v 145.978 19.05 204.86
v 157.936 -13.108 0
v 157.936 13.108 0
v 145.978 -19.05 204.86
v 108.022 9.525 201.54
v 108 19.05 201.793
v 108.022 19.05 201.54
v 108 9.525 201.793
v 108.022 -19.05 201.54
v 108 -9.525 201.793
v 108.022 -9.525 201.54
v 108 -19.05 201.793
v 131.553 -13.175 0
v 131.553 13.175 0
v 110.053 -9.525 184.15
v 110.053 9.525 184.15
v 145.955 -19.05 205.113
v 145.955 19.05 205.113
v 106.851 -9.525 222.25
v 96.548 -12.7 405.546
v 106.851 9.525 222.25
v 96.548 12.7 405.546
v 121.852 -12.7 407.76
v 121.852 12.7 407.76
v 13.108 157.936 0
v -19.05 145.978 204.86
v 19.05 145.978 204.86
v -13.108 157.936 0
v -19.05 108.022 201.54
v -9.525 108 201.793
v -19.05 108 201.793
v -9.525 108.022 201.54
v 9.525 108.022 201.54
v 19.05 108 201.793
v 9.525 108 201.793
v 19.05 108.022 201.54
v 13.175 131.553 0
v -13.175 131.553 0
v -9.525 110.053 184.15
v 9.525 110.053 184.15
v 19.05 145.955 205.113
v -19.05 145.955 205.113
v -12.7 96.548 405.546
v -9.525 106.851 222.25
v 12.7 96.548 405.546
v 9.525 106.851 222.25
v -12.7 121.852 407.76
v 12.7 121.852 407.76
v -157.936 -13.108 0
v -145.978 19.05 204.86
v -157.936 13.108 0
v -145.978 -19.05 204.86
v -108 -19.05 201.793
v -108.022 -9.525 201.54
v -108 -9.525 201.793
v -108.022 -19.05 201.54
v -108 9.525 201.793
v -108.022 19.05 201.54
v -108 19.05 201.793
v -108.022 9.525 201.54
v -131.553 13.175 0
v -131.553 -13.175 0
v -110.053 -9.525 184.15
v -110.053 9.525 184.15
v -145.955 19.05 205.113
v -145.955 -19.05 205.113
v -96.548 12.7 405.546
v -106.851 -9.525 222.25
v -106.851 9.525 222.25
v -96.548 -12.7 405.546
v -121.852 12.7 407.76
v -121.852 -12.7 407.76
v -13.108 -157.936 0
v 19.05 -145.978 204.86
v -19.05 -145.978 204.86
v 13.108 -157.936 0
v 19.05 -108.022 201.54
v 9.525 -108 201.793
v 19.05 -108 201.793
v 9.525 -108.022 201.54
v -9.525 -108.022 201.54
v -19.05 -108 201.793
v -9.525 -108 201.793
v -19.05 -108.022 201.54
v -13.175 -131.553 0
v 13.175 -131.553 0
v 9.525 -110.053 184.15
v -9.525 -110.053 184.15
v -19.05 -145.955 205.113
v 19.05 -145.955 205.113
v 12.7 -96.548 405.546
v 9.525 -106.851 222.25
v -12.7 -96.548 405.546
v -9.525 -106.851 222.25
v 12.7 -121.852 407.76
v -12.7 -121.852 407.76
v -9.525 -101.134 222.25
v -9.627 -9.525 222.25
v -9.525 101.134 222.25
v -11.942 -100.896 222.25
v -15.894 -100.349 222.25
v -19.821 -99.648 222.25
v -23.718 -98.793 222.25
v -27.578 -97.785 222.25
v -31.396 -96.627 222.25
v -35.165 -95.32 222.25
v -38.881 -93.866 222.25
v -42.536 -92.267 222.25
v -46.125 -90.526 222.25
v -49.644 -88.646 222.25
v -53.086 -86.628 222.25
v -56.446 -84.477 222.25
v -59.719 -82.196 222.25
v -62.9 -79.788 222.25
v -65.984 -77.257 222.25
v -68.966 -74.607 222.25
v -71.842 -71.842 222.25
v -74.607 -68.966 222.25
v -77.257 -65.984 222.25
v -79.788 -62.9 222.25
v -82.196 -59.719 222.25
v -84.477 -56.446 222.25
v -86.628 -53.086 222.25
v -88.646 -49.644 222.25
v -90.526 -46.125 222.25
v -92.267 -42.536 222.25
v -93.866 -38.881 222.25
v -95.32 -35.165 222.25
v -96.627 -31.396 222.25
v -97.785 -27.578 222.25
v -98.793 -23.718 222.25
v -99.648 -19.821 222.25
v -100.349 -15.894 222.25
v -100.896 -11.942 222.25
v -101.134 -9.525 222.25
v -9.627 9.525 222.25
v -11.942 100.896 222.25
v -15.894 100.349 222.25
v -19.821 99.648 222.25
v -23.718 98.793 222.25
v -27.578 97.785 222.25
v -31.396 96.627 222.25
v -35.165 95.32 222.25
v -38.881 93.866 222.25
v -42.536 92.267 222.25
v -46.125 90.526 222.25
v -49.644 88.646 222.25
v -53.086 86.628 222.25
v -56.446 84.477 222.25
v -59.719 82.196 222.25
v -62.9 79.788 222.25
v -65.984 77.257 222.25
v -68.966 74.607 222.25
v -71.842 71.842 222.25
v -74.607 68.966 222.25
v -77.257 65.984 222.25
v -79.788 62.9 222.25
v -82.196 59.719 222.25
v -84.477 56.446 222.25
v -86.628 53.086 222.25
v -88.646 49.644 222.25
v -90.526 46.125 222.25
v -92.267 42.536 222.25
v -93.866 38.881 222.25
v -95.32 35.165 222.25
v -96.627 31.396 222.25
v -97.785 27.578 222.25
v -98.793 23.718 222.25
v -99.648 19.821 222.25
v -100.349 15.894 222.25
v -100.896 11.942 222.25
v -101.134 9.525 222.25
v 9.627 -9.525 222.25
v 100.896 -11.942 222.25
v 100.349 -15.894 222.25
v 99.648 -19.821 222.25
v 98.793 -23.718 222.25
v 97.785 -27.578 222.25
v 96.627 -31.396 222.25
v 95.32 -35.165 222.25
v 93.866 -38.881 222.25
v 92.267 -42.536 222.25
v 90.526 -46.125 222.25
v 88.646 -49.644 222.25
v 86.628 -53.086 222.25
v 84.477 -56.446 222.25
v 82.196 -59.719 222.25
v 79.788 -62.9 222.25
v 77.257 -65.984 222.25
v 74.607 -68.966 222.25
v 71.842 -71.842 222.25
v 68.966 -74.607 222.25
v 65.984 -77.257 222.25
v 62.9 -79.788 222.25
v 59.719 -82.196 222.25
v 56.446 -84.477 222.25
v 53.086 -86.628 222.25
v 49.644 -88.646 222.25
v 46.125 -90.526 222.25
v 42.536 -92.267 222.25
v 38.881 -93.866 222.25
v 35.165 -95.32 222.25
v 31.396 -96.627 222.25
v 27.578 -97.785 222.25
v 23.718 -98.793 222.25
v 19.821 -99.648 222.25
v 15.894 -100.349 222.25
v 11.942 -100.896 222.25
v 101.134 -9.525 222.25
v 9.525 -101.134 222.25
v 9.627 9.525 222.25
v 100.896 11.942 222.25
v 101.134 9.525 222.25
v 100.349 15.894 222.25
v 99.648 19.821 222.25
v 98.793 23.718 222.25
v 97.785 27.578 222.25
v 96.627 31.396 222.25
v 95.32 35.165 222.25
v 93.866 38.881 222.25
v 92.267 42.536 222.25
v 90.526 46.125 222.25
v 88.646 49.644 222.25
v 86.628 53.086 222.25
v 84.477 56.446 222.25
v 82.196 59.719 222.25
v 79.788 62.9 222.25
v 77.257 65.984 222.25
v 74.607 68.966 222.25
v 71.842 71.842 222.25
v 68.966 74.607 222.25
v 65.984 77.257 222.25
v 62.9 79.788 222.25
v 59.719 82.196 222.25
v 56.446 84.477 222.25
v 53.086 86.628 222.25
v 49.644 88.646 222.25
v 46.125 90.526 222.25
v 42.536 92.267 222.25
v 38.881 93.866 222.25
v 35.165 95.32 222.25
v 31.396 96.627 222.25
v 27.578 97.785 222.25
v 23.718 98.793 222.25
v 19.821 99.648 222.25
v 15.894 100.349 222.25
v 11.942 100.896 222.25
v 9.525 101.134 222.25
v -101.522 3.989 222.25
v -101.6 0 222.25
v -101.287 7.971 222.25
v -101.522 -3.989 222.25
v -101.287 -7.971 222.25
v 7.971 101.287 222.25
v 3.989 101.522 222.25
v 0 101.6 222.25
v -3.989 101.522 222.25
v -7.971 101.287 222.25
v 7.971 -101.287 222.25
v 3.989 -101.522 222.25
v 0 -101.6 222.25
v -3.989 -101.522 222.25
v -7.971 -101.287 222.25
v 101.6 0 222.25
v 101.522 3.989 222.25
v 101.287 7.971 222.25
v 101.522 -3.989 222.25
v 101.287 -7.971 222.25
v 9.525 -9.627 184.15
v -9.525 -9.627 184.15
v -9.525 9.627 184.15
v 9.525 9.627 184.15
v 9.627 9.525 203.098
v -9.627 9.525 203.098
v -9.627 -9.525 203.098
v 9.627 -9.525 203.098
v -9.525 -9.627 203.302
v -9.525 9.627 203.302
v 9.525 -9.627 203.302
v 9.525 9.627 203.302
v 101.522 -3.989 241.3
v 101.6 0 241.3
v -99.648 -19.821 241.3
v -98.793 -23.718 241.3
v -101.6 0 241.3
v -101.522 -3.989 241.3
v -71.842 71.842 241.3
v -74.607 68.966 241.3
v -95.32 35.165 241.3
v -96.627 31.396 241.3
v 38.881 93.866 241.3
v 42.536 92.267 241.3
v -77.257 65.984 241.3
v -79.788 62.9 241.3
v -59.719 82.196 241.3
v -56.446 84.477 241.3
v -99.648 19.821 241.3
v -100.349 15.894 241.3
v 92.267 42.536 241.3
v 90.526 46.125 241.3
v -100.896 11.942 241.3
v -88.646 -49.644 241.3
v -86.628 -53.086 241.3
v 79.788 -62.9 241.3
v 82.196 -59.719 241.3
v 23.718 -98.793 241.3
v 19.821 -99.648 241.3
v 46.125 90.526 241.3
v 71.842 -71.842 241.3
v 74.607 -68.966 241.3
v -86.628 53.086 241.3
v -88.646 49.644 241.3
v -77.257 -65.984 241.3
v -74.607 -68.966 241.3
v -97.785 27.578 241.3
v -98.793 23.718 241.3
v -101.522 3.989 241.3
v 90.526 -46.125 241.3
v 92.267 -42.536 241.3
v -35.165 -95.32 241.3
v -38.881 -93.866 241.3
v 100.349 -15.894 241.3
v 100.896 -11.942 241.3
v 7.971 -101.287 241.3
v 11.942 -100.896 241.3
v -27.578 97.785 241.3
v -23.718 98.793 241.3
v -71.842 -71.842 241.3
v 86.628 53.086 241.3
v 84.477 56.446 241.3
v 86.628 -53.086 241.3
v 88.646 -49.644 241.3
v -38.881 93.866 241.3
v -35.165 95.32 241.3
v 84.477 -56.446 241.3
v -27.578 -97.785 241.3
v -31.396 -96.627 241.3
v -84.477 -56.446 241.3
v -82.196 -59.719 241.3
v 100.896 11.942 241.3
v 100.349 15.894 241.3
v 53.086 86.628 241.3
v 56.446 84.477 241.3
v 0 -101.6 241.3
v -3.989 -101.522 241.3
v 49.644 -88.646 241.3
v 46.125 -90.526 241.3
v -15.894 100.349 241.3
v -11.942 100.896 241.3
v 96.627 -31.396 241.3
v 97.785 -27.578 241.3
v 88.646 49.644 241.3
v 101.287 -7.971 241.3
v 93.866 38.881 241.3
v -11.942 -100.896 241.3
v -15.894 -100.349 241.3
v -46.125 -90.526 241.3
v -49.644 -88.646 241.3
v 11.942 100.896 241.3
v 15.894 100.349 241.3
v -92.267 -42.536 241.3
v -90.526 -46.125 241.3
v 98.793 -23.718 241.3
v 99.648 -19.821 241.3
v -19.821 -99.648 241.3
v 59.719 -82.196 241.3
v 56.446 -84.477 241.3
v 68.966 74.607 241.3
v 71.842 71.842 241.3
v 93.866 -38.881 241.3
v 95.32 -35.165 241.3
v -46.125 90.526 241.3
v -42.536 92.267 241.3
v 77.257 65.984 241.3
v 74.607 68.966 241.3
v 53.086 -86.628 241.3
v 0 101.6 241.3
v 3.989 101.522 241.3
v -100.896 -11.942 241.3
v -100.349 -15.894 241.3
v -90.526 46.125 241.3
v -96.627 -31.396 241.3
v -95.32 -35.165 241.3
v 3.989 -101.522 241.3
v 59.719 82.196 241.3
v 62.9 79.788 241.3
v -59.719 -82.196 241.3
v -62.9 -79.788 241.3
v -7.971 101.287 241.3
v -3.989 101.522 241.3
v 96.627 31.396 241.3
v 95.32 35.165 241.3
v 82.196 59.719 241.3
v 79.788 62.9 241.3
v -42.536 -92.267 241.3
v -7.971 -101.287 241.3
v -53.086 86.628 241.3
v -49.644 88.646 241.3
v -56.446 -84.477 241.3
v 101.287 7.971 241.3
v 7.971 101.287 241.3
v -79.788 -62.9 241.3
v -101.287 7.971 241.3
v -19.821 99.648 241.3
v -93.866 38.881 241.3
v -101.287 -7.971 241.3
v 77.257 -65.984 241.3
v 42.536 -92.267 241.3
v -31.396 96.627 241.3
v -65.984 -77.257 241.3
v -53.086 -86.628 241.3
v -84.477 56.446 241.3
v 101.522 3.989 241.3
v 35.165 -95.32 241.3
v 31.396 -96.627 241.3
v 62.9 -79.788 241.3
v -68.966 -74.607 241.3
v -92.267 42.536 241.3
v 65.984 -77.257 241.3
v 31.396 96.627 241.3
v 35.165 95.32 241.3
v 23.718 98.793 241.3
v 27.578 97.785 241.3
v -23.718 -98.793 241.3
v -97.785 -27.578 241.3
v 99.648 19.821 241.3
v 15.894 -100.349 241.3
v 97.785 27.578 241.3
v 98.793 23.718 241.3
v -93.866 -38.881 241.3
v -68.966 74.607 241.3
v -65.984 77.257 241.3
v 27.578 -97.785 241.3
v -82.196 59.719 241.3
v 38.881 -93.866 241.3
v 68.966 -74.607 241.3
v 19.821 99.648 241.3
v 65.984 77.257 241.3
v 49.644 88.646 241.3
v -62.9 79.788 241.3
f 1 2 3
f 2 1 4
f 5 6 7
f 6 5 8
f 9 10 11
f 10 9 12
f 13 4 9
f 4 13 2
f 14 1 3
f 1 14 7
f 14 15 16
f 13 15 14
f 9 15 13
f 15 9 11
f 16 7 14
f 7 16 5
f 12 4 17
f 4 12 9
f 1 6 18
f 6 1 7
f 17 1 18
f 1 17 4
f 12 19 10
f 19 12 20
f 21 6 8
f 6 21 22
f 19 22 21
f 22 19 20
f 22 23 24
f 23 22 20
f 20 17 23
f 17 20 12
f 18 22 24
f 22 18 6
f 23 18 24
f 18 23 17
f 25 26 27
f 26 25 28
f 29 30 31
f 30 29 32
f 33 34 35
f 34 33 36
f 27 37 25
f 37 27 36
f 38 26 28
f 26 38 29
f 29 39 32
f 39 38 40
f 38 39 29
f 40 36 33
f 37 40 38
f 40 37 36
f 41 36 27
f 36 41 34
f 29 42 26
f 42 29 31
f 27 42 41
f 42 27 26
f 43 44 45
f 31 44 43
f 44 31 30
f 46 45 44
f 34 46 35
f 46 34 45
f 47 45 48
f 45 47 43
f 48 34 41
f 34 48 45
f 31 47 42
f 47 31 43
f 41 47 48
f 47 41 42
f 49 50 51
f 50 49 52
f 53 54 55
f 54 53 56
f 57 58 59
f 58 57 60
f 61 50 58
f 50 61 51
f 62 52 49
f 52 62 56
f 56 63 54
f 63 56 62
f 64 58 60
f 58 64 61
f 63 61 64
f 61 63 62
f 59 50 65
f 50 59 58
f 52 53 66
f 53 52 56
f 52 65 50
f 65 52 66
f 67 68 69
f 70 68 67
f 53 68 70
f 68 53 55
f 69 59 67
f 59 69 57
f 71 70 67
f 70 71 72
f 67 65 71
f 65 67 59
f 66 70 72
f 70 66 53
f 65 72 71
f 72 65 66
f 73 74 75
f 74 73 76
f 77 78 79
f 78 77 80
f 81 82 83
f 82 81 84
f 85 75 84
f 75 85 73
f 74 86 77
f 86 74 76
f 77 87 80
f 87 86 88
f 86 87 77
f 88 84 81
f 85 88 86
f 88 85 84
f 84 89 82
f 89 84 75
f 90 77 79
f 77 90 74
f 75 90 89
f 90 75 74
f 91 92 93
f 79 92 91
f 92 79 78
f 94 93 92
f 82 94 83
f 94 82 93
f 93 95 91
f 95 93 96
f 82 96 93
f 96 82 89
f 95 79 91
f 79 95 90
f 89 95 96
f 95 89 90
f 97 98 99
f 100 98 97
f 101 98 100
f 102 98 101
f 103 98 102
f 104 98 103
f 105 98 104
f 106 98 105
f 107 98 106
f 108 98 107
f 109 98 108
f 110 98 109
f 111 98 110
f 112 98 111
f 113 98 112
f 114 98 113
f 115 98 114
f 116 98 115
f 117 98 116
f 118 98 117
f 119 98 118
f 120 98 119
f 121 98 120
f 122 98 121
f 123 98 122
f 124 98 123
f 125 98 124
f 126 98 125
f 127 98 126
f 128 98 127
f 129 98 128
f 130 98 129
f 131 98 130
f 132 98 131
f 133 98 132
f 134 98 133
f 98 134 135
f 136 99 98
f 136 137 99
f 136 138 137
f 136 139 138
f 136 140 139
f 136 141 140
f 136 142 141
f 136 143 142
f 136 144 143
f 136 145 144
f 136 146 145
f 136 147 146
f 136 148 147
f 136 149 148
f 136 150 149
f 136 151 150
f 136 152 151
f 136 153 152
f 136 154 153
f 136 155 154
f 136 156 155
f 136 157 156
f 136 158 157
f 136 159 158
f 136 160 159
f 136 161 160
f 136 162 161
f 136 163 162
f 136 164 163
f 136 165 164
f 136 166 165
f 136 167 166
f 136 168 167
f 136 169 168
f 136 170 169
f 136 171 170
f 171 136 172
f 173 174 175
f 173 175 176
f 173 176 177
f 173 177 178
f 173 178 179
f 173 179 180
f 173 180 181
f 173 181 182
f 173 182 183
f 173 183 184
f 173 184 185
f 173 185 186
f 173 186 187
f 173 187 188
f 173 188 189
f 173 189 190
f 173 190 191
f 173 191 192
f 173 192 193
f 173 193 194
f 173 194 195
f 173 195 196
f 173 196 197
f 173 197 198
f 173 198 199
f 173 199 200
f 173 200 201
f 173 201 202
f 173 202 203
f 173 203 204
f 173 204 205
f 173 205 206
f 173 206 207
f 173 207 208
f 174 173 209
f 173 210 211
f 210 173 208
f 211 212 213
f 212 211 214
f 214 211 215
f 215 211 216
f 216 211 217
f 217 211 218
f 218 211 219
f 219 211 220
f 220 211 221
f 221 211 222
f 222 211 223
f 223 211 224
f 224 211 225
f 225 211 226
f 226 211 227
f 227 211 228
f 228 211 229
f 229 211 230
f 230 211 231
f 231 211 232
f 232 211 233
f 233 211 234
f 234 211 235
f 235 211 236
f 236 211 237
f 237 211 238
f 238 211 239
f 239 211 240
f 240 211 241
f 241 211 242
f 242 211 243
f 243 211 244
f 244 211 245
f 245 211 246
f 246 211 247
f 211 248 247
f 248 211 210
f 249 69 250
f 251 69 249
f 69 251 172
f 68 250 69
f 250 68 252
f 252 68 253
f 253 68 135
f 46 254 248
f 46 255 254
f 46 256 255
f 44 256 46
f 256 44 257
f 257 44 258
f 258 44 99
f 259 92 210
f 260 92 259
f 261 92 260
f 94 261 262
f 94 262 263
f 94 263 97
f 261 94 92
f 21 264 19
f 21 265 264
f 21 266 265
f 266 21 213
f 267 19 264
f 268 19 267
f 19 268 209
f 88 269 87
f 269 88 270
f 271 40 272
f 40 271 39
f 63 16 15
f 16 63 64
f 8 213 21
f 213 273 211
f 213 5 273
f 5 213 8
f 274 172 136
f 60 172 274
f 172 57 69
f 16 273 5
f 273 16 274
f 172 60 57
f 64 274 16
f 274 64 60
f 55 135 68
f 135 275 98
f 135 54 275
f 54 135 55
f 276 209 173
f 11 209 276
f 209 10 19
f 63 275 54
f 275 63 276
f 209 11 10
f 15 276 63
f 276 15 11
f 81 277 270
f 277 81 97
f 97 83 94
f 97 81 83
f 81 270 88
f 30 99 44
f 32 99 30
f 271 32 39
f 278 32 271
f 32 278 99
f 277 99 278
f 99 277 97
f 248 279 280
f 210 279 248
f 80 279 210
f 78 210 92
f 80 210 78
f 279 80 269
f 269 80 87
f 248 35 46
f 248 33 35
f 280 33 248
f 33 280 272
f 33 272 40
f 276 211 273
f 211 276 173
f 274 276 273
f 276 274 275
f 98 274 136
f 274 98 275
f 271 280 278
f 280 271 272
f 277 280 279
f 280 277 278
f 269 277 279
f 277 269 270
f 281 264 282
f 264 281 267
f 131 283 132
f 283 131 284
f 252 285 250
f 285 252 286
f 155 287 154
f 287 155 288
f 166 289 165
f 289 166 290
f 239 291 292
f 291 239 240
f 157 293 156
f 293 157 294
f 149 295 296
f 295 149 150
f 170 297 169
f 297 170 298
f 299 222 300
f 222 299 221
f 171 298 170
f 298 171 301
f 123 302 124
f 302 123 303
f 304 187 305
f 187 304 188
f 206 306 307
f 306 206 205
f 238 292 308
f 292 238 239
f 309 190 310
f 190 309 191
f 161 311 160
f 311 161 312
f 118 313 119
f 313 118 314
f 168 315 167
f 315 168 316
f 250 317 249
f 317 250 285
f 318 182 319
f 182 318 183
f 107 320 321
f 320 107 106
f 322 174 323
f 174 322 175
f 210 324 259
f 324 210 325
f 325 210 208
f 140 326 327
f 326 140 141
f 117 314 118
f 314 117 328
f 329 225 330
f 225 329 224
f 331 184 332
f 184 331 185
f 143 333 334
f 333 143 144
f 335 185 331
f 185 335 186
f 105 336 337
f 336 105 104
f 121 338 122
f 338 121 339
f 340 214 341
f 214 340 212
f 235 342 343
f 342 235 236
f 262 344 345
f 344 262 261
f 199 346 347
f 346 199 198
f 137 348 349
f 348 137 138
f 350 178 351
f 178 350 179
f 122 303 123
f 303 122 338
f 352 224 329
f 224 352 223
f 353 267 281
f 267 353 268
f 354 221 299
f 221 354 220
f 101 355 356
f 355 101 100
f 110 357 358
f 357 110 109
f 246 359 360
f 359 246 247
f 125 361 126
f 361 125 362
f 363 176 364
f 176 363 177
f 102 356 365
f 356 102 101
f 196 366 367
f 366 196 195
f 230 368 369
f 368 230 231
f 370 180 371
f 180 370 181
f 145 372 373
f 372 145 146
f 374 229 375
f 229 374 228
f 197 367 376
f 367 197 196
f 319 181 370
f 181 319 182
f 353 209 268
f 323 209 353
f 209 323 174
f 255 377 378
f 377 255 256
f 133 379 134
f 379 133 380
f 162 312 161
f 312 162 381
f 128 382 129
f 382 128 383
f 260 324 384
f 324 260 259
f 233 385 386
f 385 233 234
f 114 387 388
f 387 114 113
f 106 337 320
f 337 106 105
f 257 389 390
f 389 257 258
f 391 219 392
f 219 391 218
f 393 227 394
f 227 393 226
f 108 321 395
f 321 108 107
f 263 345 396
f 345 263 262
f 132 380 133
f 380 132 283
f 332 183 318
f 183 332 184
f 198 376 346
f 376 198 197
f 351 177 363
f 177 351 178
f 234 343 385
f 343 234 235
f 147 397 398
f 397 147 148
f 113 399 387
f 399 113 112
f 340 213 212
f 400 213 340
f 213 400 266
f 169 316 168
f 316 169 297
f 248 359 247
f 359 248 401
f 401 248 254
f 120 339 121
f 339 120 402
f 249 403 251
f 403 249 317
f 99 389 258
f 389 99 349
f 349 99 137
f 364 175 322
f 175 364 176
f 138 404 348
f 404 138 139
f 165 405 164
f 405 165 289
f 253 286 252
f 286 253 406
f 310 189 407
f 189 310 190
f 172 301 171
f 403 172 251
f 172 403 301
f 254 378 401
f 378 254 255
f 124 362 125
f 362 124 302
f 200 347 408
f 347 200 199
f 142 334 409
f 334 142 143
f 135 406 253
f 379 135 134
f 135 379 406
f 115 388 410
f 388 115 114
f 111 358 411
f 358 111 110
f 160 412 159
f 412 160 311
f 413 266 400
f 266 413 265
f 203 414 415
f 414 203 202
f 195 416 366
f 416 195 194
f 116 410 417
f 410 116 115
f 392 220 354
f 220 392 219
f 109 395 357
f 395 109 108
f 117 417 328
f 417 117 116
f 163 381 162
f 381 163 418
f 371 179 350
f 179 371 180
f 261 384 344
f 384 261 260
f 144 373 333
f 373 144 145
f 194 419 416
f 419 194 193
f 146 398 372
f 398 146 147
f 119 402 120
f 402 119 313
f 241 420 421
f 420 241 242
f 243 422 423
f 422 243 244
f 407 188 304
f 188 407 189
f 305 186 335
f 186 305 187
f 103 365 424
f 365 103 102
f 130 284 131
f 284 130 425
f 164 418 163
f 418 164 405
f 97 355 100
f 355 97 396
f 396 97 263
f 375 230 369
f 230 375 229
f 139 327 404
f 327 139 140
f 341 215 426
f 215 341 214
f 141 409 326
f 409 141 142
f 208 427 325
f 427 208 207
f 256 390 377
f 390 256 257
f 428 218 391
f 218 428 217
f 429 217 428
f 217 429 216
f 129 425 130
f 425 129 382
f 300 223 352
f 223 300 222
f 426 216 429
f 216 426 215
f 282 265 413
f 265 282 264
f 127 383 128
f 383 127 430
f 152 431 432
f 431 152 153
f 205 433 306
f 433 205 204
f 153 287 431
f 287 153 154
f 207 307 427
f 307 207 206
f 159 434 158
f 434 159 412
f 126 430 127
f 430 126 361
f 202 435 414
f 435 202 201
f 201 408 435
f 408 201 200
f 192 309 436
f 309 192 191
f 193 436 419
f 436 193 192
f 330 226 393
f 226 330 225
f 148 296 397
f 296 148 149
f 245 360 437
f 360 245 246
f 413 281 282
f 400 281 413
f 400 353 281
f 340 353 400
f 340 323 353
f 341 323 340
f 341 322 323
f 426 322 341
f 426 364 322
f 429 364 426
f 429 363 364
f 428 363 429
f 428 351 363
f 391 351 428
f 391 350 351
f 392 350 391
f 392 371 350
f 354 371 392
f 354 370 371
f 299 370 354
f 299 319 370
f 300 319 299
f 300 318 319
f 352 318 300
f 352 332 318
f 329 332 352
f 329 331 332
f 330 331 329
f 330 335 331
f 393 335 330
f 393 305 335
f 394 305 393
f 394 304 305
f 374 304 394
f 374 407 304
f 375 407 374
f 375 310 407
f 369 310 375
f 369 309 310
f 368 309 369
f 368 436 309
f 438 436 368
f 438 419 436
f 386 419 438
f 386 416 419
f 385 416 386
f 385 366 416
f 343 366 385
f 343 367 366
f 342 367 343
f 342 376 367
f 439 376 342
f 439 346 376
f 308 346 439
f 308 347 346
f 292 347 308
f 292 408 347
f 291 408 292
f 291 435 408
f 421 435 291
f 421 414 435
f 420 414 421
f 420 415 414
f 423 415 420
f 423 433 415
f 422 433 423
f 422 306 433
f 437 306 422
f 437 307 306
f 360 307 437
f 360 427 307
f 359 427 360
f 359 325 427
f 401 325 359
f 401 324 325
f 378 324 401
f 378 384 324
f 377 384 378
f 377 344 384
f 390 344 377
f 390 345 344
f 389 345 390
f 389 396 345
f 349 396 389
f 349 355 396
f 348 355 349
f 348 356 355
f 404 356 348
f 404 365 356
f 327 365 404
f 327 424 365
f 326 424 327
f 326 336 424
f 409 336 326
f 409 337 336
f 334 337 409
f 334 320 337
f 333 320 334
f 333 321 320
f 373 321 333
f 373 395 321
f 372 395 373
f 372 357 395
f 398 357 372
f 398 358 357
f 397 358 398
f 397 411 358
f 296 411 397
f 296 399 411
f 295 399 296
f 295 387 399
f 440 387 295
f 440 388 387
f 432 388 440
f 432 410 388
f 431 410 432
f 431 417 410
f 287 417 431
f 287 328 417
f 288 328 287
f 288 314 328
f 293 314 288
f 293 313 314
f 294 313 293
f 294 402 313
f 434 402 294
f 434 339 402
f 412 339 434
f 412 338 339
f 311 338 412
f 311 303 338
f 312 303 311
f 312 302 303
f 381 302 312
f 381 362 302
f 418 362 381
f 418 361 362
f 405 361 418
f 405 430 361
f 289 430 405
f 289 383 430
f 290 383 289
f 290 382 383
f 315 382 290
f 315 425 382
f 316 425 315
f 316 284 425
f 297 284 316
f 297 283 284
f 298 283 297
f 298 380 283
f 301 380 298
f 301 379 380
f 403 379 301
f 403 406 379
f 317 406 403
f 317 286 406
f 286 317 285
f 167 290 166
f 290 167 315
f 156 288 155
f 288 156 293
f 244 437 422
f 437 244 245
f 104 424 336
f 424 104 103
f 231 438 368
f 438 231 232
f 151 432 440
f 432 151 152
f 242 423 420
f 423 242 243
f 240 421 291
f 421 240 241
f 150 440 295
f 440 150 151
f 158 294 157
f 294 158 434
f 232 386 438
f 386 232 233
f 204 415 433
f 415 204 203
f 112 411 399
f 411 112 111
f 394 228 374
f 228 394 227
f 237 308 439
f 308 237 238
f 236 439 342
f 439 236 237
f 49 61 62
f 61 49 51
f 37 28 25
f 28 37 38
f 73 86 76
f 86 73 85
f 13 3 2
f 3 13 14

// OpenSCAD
// =============================================================
//  Plant stand -- crossed rails, four legs running past the disc
//
//  The clever part is where the legs sit: at the ENDS of a crossed pair of
//  rails, not at the corners of a square.  Each leg then leans outward in the
//  plane of its own rail, which is a SINGLE bevel.  Legs at the corners of a
//  square have to lean toward the corner, which is a compound angle and a
//  different class of problem.  That one choice is what makes this buildable.
//
//  Everything else is joinery already in this repo:
//      - the two rails cross in a half lap, the egg-crate joint
//      - the rails are housed into the legs, the same housing as a shelf
//      - the disc just sits on the cross
//
//  The legs continue above the disc and become a cradle, so the pot cannot
//  slide off -- the ring idea done with four posts instead of a closed ring,
//  and no big circle to cut.
//
//      openscad cradle_stand.scad
//      openscad -D 'mode="exploded"' cradle_stand.scad
// =============================================================
UNIT = 25.4;

mode = "assembled";   // assembled | exploded | parts | none

// ---------------- stock
T = 0.75;

// ---------------- overall
H_TOP  = 16.00;      // floor to the top of the legs
DISC_Z =  9.50;      // floor to the TOP of the disc -- the pot stands here
DISC_D =  8.00;

// ---------------- rails
RAIL_W = 1.50;       // how deep the rail is, seen from the side
RAIL_T = T;          // its thickness

// ---------------- legs
LEG_W   = 1.50;      // square, at the rail
LEG_END = 1.00;      // at both ends -- widest at the waist, like the photo
LEG_R   = 5.00;      // radius to the leg's centre, at rail height
SPLAY   = 5;         // degrees the legs lean out.  Single bevel, not compound.

HOUSING = 0.625;     // how far the rail is let into the leg

LAP_FIT = 0.004;     // clearance in the half lap -- a real shop tolerance, and
                     // it keeps the two rails off exactly coincident faces
EPS = 0.01;

WOOD  = "#5b3a24";
WOOD2 = "#6b4630";
DISC  = "#63412a";

// ---------------- derived
Z_RAIL = DISC_Z - T - RAIL_W/2;          // centre of the rails
LEN_DN = Z_RAIL / cos(SPLAY) + 0.6;      // down the leg, past the floor
LEN_UP = (H_TOP - Z_RAIL) / cos(SPLAY);  // up the leg
RAIL_L = 2 * (LEG_R - LEG_W/2 + HOUSING);

// =============================================================
//  parts
// =============================================================
module sec(w, z) { translate([-w/2, -w/2, z]) cube([w, w, EPS]); }

// leg in its own frame: z runs along the leg, 0 at the rail
module leg_solid() {
    hull() { sec(LEG_W, 0); sec(LEG_END, -LEN_DN); }
    hull() { sec(LEG_W, 0); sec(LEG_END,  LEN_UP); }
}

// put children where leg i lives, tilted by SPLAY
module at_leg(i) {
    rotate([0, 0, i * 90])
        translate([LEG_R, 0, Z_RAIL])
            rotate([0, -SPLAY, 0])
                children();
}

// One rail running in x, before the half lap is cut.
module rail_blank() {
    translate([-RAIL_L/2, -RAIL_T/2, Z_RAIL - RAIL_W/2])
        cube([RAIL_L, RAIL_T, RAIL_W]);
}

// i = 0 notched on TOP, i = 1 notched underneath, so they interlock
module rail(i) {
    rotate([0, 0, i * 90])
        difference() {
            rail_blank();
            translate([-RAIL_T/2 - LAP_FIT, -RAIL_T/2 - EPS,
                       i == 0 ? Z_RAIL - LAP_FIT : Z_RAIL - RAIL_W/2 - EPS])
                cube([RAIL_T + 2*LAP_FIT, RAIL_T + 2*EPS,
                      RAIL_W/2 + LAP_FIT + EPS]);
        }
}

module rails() { for (i = [0, 1]) rail(i); }

// the legs, with the rail housings cut out of them
module legs() {
    difference() {
        for (i = [0 : 3]) at_leg(i) leg_solid();
        for (i = [0, 1]) rotate([0, 0, i * 90]) rail_blank();
    }
}

module disc() {
    translate([0, 0, DISC_Z - T]) linear_extrude(T) circle(d = DISC_D, $fn = 160);
}

// =============================================================
//  assembly.  Trimmed at the floor so the feet sit flat -- a splayed leg
//  cut square to its own axis stands on an edge and the whole thing rocks.
// =============================================================
module stand(explode = 0) {
    intersection() {
        union() {
            color(WOOD)  legs();
            color(WOOD2) translate([0, 0, explode * 2.2]) rails();
            color(DISC)  translate([0, 0, explode * 4.0]) disc();
        }
        translate([-40, -40, 0]) cube([80, 80, 80]);
    }
}

scale(UNIT) {
    if (mode == "assembled")     stand(0);
    else if (mode == "exploded") stand(1);
    else if (mode == "parts") {
        color(DISC) linear_extrude(T) circle(d = DISC_D, $fn = 160);
        color(WOOD2) translate([DISC_D/2 + 2, 0, 0]) rotate([0, 0, 0]) rail(0);
    }
}

echo(str("overall             = ", H_TOP, " tall, legs spread ",
         2*(LEG_R + Z_RAIL*tan(SPLAY)), " at the floor"));
echo(str("disc                = ", DISC_D, " dia x ", T, ", top at ", DISC_Z));
echo(str("legs stand proud    = ", H_TOP - DISC_Z, " above the disc"));
echo(str("clear between legs  = ", 2*(LEG_R - (DISC_Z - Z_RAIL)*tan(SPLAY)) - LEG_W,
         " at the disc, closing to ",
         2*(LEG_R - (H_TOP - Z_RAIL)*tan(SPLAY)) - LEG_W, " at the top"));
echo(str("rail                = ", RAIL_L, " x ", RAIL_W, " x ", RAIL_T,
         "  x2, half lapped"));
echo(str("leg                 = ", LEG_W, " sq at the waist, ", LEG_END,
         " at both ends"));
echo(str("splay               = ", SPLAY, " deg -- single bevel"));
